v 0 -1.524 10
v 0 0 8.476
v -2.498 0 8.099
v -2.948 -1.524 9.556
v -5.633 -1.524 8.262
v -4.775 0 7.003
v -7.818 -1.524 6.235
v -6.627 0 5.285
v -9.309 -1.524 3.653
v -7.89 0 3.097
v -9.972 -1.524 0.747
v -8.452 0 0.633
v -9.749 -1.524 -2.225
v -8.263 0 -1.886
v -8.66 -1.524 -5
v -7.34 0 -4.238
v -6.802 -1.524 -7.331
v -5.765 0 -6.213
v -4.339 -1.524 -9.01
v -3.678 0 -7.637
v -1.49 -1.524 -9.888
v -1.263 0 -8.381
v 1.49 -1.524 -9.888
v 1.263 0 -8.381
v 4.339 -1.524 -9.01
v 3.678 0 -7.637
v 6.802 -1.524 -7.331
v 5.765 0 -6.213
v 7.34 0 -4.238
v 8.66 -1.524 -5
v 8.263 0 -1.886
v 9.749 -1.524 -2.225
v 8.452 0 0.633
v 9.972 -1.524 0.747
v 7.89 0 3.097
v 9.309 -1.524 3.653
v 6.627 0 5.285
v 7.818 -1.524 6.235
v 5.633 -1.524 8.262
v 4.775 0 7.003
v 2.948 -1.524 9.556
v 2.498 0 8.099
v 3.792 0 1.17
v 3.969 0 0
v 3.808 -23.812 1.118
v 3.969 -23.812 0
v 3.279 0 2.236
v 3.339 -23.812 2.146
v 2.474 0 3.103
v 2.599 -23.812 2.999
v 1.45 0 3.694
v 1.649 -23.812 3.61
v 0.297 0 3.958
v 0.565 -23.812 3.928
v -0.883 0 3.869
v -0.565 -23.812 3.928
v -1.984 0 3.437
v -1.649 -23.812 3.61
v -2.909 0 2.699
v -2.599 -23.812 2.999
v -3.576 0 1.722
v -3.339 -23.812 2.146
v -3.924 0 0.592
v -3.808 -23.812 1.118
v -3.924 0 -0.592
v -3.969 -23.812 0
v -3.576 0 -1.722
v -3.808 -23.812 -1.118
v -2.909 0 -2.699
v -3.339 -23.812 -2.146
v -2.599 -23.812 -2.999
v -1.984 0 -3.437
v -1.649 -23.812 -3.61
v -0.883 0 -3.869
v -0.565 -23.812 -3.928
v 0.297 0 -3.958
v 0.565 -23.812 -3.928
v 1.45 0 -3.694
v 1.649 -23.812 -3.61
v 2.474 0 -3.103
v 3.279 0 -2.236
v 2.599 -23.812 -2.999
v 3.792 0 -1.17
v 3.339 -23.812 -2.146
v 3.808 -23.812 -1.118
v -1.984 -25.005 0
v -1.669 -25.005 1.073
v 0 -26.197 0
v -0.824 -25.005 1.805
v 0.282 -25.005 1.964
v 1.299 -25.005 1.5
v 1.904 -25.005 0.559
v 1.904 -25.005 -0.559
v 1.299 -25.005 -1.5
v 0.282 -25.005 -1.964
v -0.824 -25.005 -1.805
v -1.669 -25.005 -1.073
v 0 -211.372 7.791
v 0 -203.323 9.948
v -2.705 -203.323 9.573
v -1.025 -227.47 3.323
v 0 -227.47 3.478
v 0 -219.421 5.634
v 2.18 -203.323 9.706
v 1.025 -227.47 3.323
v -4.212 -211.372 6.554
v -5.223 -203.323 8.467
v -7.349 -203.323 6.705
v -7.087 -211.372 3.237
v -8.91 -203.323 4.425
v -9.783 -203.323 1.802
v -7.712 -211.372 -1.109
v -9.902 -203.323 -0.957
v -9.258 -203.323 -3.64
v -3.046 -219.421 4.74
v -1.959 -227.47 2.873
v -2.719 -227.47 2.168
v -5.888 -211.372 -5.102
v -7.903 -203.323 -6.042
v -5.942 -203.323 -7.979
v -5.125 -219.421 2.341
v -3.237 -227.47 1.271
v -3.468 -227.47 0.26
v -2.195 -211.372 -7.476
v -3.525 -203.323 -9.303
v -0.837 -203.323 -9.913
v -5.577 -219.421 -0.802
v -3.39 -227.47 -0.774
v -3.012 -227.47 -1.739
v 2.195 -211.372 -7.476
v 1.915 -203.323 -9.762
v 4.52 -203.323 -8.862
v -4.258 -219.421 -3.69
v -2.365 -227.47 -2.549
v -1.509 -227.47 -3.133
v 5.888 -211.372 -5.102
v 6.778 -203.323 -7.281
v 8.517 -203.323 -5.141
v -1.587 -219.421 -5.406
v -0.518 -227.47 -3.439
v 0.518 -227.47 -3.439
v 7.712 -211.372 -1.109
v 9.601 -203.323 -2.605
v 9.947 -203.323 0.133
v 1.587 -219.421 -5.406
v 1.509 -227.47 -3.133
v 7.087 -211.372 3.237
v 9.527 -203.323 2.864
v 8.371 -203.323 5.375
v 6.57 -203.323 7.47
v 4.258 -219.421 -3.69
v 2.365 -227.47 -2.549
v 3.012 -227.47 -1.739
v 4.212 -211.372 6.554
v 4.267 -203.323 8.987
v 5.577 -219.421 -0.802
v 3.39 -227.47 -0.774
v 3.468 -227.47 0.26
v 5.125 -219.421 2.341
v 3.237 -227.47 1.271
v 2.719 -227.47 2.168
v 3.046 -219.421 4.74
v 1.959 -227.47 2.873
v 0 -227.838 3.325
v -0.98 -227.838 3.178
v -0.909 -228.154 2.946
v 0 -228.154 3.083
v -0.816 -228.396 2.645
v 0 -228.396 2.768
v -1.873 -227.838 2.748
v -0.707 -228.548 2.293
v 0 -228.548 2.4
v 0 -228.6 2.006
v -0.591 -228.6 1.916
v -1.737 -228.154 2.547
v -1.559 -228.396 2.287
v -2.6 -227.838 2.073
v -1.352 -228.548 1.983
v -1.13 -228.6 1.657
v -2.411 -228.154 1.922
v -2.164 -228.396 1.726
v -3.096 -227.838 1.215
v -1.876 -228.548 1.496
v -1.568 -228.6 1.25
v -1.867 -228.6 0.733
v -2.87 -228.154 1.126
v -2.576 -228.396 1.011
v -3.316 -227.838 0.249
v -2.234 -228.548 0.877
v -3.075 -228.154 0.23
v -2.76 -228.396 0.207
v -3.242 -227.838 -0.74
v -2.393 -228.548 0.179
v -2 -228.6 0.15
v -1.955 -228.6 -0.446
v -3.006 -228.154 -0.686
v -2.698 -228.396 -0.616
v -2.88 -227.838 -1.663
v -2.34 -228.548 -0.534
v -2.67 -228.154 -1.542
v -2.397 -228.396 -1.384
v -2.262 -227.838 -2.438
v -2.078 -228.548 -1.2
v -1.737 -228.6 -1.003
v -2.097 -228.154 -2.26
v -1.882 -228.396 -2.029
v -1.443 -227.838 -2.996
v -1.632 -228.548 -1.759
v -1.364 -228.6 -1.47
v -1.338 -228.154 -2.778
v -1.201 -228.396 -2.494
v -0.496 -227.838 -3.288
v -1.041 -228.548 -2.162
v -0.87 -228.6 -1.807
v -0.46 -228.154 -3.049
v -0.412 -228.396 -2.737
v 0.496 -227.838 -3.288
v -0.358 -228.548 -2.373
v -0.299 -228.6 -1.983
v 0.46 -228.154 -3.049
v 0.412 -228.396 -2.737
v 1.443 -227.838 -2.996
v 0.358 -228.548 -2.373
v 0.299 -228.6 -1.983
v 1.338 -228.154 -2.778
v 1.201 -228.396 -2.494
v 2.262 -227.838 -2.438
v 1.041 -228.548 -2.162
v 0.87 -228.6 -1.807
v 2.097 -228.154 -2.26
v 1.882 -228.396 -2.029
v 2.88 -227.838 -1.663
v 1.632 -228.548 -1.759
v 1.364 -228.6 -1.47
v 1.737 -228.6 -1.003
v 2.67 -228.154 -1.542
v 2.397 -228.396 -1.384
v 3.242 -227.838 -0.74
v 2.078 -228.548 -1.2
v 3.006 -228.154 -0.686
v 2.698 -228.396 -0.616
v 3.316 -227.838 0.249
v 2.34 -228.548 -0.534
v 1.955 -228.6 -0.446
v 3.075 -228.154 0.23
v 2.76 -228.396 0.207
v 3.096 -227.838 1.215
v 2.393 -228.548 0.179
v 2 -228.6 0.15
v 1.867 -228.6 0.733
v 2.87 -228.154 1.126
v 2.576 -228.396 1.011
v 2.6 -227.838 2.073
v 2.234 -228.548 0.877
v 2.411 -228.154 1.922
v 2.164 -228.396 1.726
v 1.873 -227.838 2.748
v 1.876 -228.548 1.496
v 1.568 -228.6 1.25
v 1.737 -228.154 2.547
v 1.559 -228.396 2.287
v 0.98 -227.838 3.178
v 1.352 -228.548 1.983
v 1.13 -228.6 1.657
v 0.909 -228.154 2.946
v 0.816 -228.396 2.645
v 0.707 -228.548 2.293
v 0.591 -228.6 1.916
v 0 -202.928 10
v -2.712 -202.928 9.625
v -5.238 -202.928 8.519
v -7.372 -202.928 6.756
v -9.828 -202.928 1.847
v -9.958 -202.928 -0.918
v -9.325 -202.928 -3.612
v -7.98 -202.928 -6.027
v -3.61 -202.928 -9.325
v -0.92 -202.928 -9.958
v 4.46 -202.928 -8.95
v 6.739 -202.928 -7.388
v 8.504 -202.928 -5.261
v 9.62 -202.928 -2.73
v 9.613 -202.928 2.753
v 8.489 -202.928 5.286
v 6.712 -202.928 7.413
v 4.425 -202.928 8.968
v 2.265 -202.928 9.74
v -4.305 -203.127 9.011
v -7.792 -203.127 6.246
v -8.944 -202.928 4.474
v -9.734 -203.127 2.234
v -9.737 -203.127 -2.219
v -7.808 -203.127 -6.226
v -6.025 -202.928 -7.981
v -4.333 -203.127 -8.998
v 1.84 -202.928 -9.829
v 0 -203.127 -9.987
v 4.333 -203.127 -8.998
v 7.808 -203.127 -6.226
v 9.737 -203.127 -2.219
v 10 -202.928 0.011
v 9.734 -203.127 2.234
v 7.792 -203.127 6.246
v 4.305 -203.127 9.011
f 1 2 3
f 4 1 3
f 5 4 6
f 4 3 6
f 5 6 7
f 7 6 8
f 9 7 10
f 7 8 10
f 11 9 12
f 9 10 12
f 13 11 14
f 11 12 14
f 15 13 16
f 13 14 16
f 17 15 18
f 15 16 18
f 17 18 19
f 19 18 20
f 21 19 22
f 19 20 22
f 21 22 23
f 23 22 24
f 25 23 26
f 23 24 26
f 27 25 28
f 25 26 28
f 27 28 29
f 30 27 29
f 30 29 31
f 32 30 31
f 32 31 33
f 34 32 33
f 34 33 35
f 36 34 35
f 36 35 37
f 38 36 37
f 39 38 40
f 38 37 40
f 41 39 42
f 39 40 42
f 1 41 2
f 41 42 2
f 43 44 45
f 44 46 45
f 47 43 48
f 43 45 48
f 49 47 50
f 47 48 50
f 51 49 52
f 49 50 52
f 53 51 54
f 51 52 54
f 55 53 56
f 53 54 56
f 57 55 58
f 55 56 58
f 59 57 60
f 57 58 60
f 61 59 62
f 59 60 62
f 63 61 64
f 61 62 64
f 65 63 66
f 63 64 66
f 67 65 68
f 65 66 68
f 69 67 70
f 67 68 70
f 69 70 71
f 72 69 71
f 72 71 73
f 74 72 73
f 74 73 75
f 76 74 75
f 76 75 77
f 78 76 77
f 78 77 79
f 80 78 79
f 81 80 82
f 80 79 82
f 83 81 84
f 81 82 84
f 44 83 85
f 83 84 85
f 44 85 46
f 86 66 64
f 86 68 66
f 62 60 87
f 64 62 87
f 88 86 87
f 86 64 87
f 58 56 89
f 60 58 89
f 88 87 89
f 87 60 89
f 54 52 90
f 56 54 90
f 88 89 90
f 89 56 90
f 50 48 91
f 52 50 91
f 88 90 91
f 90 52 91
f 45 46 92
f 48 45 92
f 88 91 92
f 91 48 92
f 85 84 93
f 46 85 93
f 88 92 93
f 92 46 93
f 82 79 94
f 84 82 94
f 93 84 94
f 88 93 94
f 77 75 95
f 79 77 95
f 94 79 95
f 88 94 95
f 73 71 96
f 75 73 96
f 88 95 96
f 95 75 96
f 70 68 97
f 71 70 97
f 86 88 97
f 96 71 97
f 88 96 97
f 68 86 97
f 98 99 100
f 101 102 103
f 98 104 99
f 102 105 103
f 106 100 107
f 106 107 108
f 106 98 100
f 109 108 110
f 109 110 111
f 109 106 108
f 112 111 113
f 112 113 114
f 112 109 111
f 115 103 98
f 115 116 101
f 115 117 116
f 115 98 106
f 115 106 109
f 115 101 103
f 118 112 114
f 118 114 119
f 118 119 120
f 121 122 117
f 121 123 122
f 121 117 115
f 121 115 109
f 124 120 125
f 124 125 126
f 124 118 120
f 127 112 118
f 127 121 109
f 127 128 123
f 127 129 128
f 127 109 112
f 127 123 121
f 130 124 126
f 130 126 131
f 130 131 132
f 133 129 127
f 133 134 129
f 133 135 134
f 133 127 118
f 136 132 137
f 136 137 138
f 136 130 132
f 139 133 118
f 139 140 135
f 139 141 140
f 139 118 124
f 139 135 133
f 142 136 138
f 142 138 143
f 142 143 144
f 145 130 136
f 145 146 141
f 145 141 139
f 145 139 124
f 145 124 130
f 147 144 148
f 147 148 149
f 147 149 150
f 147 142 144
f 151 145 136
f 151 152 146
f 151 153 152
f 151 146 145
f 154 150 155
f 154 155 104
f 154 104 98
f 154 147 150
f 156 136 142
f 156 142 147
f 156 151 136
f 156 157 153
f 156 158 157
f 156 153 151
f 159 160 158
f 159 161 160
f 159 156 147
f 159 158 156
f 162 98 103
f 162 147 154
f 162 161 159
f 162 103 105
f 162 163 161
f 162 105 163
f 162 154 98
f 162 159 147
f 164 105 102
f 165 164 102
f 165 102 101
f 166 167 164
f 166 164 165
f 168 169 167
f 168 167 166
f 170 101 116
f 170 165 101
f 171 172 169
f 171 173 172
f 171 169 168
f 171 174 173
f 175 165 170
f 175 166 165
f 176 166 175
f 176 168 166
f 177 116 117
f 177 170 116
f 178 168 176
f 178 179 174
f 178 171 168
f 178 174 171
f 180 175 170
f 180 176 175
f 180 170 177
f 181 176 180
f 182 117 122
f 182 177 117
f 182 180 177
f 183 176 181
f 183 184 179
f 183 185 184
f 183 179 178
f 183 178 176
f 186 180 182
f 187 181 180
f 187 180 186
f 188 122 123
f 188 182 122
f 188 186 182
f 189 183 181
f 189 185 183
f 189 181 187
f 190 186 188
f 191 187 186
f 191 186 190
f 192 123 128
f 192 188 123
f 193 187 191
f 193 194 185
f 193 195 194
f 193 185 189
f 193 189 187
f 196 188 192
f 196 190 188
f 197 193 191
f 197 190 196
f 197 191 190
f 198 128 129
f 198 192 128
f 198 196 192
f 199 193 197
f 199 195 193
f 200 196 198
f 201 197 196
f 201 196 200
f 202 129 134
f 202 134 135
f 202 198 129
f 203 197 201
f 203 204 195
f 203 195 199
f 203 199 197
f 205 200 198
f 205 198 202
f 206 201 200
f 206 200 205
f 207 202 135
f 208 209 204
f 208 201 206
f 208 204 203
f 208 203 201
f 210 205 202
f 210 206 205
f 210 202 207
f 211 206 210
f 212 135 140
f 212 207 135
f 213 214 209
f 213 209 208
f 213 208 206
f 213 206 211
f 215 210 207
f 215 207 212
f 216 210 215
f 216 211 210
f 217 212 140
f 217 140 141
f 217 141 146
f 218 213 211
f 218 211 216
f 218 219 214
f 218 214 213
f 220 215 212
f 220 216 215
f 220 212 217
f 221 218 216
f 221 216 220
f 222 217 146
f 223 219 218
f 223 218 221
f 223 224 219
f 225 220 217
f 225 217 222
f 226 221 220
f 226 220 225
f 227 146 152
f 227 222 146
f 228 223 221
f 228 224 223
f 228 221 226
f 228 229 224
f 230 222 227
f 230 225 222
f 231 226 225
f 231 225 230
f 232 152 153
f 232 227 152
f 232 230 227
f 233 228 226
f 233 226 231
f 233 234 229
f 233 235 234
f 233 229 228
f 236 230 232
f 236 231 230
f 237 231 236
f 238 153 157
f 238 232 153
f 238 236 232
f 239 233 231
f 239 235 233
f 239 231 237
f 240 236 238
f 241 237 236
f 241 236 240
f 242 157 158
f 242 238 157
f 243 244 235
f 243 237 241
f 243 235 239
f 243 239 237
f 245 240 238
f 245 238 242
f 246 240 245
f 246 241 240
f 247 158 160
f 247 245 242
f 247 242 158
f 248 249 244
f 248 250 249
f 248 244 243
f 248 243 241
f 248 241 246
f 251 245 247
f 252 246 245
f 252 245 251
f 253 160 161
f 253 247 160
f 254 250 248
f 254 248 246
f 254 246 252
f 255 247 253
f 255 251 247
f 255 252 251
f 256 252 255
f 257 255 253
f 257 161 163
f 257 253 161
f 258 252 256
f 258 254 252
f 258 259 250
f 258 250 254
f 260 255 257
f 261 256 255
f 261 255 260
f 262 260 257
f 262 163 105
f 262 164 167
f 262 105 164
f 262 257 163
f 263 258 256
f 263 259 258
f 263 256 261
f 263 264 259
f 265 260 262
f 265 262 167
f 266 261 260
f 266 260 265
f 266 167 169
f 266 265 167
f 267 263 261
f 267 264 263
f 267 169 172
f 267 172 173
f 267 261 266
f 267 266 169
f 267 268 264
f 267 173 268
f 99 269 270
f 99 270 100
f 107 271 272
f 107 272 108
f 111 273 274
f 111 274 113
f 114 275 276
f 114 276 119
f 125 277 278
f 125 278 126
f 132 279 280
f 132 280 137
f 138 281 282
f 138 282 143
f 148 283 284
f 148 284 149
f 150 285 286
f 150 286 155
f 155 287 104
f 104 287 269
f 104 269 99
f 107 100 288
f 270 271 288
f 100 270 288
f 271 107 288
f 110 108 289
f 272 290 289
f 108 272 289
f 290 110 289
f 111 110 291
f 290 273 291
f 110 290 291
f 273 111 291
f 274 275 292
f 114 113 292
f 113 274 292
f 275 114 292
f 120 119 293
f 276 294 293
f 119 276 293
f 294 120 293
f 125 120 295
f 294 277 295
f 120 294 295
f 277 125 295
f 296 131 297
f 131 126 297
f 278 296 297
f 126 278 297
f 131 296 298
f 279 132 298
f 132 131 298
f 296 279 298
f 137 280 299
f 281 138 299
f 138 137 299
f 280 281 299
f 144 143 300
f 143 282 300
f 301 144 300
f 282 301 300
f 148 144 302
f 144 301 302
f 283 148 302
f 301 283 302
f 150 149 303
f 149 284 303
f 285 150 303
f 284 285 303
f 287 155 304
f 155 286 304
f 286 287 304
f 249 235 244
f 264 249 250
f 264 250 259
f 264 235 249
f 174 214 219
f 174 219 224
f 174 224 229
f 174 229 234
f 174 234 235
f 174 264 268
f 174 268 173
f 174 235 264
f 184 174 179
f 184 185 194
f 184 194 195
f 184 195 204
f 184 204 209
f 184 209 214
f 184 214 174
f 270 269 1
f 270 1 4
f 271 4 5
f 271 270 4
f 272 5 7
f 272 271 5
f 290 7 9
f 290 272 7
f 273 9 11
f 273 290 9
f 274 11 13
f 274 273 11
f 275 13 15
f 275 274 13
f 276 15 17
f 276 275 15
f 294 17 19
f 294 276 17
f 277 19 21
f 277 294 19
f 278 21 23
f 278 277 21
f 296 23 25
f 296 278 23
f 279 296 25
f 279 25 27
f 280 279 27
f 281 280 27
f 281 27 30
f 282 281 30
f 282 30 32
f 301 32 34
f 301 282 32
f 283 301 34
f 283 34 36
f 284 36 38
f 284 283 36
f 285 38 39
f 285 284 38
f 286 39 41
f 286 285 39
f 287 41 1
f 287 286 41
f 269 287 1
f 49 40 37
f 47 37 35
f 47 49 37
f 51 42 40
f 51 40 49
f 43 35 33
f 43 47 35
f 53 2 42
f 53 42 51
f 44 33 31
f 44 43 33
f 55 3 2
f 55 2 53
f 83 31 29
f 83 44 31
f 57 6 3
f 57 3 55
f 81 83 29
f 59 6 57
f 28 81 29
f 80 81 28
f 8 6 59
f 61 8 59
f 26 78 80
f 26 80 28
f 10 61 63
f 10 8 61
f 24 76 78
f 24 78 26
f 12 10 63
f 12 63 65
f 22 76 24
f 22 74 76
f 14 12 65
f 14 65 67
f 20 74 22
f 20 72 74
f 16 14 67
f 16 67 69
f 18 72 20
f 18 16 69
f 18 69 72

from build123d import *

# Parameters (mm, degrees)
F2_R     = 1.524
F4_D     = 7.9375
F4_DEPTH = 23.8125
F4_TIP   = 2.3846655818
F5_SIZE  = 1.524


with BuildPart() as f1:
    # F0 (on Right) → F1 (revolve)
    with BuildSketch(Plane.YZ):
        Polygon((-228.6, 0), (0, 0), (0, 10), (-203.1287532383, 10), (-228.6, 3.175), align=None)
    revolve(axis=Axis((0, -114.3, 0), (0, -1, 0)))

    # F2
    f2_edges = [f1.edges().sort_by_distance(p)[0] for p in [
        (0, -203.128753, -10),
        (0, -228.6, -3.175),
    ]]
    fillet(f2_edges, radius=F2_R)

    # F4
    with Locations(Plane(origin=(0, 0, 0), x_dir=(-1, 0, 0), z_dir=(0, 1, 0))):
        with Locations((0, 0)):
            Hole(F4_D / 2, depth=F4_DEPTH)
            with Locations((0, 0, -(F4_DEPTH + F4_TIP / 2))):  # 118° drill point
                Cone(0, F4_D / 2, F4_TIP, mode=Mode.SUBTRACT)

    # F5
    f5_edges = [f1.edges().sort_by_distance(p)[0] for p in [
        (0, 0, -10),
    ]]
    chamfer(f5_edges, length=F5_SIZE)


solid = f1.part
